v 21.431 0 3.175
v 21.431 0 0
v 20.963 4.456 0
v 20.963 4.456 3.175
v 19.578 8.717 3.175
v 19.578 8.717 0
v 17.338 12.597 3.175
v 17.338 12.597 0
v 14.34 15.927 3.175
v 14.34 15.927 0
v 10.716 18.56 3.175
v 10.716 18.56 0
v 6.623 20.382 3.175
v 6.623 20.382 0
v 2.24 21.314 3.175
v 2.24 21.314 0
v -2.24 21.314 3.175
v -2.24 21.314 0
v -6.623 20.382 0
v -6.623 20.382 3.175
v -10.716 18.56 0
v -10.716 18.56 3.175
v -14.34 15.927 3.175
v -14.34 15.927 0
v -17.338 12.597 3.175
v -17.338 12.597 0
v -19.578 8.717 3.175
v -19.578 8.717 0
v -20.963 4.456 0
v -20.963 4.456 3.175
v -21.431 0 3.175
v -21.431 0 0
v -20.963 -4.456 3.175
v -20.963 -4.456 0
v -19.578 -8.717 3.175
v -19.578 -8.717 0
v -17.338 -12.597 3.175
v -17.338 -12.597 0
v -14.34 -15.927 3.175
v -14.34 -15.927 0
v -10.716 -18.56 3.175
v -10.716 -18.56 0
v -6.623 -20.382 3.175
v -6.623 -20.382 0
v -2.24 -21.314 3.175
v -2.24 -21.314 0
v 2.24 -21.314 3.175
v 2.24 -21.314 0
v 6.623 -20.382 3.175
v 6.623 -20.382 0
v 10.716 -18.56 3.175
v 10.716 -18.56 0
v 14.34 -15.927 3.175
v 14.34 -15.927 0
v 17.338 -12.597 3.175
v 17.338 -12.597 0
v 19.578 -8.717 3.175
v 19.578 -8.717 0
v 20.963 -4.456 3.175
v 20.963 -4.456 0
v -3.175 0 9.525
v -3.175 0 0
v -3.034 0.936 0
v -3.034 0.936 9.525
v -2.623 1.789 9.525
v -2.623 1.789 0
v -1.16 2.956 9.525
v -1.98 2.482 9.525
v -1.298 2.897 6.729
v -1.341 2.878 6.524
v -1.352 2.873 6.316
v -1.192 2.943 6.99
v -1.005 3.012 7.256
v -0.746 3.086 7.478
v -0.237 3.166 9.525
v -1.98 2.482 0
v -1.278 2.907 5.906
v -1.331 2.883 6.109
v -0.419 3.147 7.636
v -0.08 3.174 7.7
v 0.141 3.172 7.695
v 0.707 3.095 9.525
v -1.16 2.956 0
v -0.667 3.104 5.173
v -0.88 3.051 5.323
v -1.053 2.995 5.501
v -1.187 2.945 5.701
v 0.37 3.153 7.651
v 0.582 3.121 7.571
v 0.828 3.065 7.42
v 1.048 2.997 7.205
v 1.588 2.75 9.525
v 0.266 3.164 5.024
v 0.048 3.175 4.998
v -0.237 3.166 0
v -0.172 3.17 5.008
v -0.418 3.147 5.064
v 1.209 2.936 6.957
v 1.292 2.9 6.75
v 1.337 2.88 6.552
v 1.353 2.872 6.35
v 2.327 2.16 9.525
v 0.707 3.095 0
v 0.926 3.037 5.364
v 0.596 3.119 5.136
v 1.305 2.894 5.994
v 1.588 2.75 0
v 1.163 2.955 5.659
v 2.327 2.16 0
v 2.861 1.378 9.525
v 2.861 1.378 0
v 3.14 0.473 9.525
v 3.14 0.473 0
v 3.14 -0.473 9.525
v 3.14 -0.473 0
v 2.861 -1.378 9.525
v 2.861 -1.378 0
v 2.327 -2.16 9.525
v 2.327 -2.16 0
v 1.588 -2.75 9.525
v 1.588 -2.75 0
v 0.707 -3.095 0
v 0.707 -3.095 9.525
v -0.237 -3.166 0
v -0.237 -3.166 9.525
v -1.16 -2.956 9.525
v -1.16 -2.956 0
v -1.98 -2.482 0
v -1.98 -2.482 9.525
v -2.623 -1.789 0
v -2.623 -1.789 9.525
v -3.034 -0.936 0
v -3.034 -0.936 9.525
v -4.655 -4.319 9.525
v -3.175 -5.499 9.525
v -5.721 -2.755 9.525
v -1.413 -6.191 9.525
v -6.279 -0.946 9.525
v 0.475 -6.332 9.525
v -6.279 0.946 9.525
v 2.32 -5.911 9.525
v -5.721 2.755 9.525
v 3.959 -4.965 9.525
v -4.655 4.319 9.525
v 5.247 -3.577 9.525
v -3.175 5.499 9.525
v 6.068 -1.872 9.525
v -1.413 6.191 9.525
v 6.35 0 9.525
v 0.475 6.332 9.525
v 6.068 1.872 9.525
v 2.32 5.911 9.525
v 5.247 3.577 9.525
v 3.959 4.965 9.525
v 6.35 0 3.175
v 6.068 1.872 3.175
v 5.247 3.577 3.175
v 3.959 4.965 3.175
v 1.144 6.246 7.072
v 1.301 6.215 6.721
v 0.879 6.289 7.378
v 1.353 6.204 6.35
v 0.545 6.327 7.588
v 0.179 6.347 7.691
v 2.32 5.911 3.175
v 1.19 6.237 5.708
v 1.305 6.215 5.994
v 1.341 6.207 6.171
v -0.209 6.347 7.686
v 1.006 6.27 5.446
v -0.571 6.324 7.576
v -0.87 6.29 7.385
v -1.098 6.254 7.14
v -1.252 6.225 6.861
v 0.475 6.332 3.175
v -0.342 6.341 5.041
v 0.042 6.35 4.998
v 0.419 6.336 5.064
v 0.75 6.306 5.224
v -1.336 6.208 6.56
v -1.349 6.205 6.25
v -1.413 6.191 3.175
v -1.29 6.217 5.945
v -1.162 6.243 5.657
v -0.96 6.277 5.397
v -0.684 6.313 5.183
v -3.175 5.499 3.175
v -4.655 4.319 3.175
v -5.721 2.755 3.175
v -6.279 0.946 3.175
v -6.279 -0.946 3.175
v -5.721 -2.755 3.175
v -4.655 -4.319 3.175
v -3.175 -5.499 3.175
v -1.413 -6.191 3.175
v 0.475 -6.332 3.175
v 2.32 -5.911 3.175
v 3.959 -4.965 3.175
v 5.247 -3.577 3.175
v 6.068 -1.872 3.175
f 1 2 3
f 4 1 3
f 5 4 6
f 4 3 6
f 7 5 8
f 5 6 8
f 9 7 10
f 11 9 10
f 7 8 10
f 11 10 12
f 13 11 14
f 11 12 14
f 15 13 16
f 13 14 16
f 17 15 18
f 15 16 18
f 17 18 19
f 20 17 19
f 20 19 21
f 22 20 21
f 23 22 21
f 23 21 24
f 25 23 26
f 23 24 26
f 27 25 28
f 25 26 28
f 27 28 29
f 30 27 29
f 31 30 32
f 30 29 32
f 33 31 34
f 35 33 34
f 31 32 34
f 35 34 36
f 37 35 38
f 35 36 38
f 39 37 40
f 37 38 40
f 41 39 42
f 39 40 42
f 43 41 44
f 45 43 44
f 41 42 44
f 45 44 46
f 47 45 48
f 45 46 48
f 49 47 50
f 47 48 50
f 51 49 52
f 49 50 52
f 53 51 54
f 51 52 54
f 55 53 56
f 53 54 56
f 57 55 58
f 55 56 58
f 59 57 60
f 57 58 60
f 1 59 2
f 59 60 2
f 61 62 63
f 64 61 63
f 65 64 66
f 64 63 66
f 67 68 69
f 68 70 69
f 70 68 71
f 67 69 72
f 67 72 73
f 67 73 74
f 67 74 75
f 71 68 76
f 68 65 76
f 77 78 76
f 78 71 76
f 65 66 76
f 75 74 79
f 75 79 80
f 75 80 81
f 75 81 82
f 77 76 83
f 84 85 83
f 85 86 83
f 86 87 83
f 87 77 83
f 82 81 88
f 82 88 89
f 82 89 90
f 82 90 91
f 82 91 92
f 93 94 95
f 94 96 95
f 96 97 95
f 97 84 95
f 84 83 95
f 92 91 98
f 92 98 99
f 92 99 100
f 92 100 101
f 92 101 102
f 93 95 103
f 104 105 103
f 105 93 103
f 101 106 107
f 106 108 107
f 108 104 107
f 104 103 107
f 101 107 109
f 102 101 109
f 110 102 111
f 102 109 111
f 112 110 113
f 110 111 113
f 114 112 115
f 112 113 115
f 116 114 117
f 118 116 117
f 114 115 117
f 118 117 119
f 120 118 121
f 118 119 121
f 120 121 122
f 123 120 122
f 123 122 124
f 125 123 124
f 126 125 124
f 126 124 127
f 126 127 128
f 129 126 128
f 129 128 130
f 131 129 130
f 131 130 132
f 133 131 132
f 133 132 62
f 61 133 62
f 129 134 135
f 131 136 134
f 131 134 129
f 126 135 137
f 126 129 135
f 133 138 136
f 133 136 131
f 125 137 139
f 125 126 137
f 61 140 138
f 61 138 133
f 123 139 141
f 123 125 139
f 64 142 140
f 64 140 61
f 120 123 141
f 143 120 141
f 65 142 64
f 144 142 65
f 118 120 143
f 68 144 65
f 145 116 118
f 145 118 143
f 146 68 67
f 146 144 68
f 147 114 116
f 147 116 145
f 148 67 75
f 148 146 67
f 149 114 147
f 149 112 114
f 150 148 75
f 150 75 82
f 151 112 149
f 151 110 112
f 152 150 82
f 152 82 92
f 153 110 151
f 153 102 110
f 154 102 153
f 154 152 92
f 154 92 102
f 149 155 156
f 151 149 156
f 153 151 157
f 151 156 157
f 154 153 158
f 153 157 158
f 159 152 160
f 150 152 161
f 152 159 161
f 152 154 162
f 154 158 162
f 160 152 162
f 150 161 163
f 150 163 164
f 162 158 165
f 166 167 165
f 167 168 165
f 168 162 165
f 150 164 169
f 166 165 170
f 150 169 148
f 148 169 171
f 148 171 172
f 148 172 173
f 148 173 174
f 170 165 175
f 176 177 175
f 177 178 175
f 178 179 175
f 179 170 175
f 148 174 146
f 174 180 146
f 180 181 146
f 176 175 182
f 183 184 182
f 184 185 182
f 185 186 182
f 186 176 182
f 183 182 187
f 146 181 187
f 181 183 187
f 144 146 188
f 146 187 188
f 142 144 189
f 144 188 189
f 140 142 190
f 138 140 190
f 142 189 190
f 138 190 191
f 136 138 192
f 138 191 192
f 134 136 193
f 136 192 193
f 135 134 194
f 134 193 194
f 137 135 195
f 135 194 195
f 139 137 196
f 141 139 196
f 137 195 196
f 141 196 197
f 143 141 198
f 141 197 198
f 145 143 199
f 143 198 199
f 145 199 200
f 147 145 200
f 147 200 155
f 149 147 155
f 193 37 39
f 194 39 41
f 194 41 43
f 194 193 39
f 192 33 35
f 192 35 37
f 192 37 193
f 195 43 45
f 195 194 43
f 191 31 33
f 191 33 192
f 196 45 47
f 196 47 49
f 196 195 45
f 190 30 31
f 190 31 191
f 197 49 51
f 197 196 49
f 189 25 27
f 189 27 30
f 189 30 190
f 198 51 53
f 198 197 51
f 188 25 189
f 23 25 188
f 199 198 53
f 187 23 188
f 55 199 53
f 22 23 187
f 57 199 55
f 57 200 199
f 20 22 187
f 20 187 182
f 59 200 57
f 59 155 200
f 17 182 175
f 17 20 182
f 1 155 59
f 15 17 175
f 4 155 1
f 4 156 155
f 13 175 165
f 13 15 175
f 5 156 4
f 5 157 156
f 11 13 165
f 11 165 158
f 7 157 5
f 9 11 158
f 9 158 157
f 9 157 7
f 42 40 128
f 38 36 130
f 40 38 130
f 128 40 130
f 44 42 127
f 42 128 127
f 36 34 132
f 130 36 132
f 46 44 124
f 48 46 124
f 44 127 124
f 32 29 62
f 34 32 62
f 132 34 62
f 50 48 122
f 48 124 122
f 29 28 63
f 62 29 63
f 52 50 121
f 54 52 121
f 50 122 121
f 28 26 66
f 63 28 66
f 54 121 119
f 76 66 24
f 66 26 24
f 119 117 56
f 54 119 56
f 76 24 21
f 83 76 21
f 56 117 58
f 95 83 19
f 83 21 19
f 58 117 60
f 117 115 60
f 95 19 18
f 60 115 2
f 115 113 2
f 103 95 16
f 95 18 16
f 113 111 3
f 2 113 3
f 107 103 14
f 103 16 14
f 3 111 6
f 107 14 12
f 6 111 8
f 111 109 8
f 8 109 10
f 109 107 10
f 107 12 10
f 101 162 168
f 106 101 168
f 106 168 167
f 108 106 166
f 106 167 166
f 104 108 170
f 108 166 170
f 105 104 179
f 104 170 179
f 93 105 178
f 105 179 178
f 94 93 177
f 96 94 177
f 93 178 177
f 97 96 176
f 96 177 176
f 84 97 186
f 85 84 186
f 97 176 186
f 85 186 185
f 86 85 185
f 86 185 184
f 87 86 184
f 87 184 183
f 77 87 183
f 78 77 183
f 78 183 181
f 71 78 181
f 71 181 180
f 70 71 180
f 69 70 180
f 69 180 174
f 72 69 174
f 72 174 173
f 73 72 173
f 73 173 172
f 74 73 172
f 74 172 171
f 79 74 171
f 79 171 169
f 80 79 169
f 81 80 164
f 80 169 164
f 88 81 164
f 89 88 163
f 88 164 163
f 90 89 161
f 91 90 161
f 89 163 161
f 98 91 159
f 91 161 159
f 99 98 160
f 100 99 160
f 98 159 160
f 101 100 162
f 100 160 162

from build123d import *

# Parameters (mm, degrees)
SKETCH1_R                  = 21.43125
BOSS_EXTRUDE1_DEPTH        = 3.175
SKETCH2_R                  = 6.35
BOSS_EXTRUDE2_DEPTH        = 6.35
SKETCH3_R                  = 3.175
CUT_EXTRUDE1_DEPTH         = 32.769837553
F_6_32_TAPPED_HOLE1_REACH  = 38.357
F_6_32_TAPPED_HOLE1_BORE_R = 1.35255


with BuildPart() as part:
    # Sketch1 → Boss-Extrude1 (new body)
    with BuildSketch(Plane.XY):
        Circle(SKETCH1_R)
    extrude(amount=BOSS_EXTRUDE1_DEPTH)

    # Sketch2 → Boss-Extrude2 (add)
    with BuildSketch(Plane.XY.offset(3.175)):
        Circle(SKETCH2_R)
    extrude(amount=BOSS_EXTRUDE2_DEPTH)

    # Sketch3 → Cut-Extrude1 (cut, through all)
    with BuildSketch(Plane(origin=(0, 0, 0), x_dir=(-1, 0, 0), z_dir=(0, 0, -1))):
        Circle(SKETCH3_R)
    extrude(amount=-CUT_EXTRUDE1_DEPTH, mode=Mode.SUBTRACT)

    # #6-32 Tapped Hole1 bore → #6-32 Tapped Hole1 (cut, up to next)
    with BuildSketch(Plane(origin=(0, 6.35, 0), x_dir=(1, 0, 0), z_dir=(0, 1, 0)), mode=Mode.PRIVATE) as f_6_32_tapped_hole1_sk1:
        with Locations((0, -6.35)):
            Circle(F_6_32_TAPPED_HOLE1_BORE_R)
    f_6_32_tapped_hole1_tool1 = extrude(f_6_32_tapped_hole1_sk1.sketch, amount=-F_6_32_TAPPED_HOLE1_REACH, mode=Mode.PRIVATE) & part.part
    add(f_6_32_tapped_hole1_tool1.solids().sort_by_distance((0, 6.35, 6.35))[0], mode=Mode.SUBTRACT)


solid = part.part
